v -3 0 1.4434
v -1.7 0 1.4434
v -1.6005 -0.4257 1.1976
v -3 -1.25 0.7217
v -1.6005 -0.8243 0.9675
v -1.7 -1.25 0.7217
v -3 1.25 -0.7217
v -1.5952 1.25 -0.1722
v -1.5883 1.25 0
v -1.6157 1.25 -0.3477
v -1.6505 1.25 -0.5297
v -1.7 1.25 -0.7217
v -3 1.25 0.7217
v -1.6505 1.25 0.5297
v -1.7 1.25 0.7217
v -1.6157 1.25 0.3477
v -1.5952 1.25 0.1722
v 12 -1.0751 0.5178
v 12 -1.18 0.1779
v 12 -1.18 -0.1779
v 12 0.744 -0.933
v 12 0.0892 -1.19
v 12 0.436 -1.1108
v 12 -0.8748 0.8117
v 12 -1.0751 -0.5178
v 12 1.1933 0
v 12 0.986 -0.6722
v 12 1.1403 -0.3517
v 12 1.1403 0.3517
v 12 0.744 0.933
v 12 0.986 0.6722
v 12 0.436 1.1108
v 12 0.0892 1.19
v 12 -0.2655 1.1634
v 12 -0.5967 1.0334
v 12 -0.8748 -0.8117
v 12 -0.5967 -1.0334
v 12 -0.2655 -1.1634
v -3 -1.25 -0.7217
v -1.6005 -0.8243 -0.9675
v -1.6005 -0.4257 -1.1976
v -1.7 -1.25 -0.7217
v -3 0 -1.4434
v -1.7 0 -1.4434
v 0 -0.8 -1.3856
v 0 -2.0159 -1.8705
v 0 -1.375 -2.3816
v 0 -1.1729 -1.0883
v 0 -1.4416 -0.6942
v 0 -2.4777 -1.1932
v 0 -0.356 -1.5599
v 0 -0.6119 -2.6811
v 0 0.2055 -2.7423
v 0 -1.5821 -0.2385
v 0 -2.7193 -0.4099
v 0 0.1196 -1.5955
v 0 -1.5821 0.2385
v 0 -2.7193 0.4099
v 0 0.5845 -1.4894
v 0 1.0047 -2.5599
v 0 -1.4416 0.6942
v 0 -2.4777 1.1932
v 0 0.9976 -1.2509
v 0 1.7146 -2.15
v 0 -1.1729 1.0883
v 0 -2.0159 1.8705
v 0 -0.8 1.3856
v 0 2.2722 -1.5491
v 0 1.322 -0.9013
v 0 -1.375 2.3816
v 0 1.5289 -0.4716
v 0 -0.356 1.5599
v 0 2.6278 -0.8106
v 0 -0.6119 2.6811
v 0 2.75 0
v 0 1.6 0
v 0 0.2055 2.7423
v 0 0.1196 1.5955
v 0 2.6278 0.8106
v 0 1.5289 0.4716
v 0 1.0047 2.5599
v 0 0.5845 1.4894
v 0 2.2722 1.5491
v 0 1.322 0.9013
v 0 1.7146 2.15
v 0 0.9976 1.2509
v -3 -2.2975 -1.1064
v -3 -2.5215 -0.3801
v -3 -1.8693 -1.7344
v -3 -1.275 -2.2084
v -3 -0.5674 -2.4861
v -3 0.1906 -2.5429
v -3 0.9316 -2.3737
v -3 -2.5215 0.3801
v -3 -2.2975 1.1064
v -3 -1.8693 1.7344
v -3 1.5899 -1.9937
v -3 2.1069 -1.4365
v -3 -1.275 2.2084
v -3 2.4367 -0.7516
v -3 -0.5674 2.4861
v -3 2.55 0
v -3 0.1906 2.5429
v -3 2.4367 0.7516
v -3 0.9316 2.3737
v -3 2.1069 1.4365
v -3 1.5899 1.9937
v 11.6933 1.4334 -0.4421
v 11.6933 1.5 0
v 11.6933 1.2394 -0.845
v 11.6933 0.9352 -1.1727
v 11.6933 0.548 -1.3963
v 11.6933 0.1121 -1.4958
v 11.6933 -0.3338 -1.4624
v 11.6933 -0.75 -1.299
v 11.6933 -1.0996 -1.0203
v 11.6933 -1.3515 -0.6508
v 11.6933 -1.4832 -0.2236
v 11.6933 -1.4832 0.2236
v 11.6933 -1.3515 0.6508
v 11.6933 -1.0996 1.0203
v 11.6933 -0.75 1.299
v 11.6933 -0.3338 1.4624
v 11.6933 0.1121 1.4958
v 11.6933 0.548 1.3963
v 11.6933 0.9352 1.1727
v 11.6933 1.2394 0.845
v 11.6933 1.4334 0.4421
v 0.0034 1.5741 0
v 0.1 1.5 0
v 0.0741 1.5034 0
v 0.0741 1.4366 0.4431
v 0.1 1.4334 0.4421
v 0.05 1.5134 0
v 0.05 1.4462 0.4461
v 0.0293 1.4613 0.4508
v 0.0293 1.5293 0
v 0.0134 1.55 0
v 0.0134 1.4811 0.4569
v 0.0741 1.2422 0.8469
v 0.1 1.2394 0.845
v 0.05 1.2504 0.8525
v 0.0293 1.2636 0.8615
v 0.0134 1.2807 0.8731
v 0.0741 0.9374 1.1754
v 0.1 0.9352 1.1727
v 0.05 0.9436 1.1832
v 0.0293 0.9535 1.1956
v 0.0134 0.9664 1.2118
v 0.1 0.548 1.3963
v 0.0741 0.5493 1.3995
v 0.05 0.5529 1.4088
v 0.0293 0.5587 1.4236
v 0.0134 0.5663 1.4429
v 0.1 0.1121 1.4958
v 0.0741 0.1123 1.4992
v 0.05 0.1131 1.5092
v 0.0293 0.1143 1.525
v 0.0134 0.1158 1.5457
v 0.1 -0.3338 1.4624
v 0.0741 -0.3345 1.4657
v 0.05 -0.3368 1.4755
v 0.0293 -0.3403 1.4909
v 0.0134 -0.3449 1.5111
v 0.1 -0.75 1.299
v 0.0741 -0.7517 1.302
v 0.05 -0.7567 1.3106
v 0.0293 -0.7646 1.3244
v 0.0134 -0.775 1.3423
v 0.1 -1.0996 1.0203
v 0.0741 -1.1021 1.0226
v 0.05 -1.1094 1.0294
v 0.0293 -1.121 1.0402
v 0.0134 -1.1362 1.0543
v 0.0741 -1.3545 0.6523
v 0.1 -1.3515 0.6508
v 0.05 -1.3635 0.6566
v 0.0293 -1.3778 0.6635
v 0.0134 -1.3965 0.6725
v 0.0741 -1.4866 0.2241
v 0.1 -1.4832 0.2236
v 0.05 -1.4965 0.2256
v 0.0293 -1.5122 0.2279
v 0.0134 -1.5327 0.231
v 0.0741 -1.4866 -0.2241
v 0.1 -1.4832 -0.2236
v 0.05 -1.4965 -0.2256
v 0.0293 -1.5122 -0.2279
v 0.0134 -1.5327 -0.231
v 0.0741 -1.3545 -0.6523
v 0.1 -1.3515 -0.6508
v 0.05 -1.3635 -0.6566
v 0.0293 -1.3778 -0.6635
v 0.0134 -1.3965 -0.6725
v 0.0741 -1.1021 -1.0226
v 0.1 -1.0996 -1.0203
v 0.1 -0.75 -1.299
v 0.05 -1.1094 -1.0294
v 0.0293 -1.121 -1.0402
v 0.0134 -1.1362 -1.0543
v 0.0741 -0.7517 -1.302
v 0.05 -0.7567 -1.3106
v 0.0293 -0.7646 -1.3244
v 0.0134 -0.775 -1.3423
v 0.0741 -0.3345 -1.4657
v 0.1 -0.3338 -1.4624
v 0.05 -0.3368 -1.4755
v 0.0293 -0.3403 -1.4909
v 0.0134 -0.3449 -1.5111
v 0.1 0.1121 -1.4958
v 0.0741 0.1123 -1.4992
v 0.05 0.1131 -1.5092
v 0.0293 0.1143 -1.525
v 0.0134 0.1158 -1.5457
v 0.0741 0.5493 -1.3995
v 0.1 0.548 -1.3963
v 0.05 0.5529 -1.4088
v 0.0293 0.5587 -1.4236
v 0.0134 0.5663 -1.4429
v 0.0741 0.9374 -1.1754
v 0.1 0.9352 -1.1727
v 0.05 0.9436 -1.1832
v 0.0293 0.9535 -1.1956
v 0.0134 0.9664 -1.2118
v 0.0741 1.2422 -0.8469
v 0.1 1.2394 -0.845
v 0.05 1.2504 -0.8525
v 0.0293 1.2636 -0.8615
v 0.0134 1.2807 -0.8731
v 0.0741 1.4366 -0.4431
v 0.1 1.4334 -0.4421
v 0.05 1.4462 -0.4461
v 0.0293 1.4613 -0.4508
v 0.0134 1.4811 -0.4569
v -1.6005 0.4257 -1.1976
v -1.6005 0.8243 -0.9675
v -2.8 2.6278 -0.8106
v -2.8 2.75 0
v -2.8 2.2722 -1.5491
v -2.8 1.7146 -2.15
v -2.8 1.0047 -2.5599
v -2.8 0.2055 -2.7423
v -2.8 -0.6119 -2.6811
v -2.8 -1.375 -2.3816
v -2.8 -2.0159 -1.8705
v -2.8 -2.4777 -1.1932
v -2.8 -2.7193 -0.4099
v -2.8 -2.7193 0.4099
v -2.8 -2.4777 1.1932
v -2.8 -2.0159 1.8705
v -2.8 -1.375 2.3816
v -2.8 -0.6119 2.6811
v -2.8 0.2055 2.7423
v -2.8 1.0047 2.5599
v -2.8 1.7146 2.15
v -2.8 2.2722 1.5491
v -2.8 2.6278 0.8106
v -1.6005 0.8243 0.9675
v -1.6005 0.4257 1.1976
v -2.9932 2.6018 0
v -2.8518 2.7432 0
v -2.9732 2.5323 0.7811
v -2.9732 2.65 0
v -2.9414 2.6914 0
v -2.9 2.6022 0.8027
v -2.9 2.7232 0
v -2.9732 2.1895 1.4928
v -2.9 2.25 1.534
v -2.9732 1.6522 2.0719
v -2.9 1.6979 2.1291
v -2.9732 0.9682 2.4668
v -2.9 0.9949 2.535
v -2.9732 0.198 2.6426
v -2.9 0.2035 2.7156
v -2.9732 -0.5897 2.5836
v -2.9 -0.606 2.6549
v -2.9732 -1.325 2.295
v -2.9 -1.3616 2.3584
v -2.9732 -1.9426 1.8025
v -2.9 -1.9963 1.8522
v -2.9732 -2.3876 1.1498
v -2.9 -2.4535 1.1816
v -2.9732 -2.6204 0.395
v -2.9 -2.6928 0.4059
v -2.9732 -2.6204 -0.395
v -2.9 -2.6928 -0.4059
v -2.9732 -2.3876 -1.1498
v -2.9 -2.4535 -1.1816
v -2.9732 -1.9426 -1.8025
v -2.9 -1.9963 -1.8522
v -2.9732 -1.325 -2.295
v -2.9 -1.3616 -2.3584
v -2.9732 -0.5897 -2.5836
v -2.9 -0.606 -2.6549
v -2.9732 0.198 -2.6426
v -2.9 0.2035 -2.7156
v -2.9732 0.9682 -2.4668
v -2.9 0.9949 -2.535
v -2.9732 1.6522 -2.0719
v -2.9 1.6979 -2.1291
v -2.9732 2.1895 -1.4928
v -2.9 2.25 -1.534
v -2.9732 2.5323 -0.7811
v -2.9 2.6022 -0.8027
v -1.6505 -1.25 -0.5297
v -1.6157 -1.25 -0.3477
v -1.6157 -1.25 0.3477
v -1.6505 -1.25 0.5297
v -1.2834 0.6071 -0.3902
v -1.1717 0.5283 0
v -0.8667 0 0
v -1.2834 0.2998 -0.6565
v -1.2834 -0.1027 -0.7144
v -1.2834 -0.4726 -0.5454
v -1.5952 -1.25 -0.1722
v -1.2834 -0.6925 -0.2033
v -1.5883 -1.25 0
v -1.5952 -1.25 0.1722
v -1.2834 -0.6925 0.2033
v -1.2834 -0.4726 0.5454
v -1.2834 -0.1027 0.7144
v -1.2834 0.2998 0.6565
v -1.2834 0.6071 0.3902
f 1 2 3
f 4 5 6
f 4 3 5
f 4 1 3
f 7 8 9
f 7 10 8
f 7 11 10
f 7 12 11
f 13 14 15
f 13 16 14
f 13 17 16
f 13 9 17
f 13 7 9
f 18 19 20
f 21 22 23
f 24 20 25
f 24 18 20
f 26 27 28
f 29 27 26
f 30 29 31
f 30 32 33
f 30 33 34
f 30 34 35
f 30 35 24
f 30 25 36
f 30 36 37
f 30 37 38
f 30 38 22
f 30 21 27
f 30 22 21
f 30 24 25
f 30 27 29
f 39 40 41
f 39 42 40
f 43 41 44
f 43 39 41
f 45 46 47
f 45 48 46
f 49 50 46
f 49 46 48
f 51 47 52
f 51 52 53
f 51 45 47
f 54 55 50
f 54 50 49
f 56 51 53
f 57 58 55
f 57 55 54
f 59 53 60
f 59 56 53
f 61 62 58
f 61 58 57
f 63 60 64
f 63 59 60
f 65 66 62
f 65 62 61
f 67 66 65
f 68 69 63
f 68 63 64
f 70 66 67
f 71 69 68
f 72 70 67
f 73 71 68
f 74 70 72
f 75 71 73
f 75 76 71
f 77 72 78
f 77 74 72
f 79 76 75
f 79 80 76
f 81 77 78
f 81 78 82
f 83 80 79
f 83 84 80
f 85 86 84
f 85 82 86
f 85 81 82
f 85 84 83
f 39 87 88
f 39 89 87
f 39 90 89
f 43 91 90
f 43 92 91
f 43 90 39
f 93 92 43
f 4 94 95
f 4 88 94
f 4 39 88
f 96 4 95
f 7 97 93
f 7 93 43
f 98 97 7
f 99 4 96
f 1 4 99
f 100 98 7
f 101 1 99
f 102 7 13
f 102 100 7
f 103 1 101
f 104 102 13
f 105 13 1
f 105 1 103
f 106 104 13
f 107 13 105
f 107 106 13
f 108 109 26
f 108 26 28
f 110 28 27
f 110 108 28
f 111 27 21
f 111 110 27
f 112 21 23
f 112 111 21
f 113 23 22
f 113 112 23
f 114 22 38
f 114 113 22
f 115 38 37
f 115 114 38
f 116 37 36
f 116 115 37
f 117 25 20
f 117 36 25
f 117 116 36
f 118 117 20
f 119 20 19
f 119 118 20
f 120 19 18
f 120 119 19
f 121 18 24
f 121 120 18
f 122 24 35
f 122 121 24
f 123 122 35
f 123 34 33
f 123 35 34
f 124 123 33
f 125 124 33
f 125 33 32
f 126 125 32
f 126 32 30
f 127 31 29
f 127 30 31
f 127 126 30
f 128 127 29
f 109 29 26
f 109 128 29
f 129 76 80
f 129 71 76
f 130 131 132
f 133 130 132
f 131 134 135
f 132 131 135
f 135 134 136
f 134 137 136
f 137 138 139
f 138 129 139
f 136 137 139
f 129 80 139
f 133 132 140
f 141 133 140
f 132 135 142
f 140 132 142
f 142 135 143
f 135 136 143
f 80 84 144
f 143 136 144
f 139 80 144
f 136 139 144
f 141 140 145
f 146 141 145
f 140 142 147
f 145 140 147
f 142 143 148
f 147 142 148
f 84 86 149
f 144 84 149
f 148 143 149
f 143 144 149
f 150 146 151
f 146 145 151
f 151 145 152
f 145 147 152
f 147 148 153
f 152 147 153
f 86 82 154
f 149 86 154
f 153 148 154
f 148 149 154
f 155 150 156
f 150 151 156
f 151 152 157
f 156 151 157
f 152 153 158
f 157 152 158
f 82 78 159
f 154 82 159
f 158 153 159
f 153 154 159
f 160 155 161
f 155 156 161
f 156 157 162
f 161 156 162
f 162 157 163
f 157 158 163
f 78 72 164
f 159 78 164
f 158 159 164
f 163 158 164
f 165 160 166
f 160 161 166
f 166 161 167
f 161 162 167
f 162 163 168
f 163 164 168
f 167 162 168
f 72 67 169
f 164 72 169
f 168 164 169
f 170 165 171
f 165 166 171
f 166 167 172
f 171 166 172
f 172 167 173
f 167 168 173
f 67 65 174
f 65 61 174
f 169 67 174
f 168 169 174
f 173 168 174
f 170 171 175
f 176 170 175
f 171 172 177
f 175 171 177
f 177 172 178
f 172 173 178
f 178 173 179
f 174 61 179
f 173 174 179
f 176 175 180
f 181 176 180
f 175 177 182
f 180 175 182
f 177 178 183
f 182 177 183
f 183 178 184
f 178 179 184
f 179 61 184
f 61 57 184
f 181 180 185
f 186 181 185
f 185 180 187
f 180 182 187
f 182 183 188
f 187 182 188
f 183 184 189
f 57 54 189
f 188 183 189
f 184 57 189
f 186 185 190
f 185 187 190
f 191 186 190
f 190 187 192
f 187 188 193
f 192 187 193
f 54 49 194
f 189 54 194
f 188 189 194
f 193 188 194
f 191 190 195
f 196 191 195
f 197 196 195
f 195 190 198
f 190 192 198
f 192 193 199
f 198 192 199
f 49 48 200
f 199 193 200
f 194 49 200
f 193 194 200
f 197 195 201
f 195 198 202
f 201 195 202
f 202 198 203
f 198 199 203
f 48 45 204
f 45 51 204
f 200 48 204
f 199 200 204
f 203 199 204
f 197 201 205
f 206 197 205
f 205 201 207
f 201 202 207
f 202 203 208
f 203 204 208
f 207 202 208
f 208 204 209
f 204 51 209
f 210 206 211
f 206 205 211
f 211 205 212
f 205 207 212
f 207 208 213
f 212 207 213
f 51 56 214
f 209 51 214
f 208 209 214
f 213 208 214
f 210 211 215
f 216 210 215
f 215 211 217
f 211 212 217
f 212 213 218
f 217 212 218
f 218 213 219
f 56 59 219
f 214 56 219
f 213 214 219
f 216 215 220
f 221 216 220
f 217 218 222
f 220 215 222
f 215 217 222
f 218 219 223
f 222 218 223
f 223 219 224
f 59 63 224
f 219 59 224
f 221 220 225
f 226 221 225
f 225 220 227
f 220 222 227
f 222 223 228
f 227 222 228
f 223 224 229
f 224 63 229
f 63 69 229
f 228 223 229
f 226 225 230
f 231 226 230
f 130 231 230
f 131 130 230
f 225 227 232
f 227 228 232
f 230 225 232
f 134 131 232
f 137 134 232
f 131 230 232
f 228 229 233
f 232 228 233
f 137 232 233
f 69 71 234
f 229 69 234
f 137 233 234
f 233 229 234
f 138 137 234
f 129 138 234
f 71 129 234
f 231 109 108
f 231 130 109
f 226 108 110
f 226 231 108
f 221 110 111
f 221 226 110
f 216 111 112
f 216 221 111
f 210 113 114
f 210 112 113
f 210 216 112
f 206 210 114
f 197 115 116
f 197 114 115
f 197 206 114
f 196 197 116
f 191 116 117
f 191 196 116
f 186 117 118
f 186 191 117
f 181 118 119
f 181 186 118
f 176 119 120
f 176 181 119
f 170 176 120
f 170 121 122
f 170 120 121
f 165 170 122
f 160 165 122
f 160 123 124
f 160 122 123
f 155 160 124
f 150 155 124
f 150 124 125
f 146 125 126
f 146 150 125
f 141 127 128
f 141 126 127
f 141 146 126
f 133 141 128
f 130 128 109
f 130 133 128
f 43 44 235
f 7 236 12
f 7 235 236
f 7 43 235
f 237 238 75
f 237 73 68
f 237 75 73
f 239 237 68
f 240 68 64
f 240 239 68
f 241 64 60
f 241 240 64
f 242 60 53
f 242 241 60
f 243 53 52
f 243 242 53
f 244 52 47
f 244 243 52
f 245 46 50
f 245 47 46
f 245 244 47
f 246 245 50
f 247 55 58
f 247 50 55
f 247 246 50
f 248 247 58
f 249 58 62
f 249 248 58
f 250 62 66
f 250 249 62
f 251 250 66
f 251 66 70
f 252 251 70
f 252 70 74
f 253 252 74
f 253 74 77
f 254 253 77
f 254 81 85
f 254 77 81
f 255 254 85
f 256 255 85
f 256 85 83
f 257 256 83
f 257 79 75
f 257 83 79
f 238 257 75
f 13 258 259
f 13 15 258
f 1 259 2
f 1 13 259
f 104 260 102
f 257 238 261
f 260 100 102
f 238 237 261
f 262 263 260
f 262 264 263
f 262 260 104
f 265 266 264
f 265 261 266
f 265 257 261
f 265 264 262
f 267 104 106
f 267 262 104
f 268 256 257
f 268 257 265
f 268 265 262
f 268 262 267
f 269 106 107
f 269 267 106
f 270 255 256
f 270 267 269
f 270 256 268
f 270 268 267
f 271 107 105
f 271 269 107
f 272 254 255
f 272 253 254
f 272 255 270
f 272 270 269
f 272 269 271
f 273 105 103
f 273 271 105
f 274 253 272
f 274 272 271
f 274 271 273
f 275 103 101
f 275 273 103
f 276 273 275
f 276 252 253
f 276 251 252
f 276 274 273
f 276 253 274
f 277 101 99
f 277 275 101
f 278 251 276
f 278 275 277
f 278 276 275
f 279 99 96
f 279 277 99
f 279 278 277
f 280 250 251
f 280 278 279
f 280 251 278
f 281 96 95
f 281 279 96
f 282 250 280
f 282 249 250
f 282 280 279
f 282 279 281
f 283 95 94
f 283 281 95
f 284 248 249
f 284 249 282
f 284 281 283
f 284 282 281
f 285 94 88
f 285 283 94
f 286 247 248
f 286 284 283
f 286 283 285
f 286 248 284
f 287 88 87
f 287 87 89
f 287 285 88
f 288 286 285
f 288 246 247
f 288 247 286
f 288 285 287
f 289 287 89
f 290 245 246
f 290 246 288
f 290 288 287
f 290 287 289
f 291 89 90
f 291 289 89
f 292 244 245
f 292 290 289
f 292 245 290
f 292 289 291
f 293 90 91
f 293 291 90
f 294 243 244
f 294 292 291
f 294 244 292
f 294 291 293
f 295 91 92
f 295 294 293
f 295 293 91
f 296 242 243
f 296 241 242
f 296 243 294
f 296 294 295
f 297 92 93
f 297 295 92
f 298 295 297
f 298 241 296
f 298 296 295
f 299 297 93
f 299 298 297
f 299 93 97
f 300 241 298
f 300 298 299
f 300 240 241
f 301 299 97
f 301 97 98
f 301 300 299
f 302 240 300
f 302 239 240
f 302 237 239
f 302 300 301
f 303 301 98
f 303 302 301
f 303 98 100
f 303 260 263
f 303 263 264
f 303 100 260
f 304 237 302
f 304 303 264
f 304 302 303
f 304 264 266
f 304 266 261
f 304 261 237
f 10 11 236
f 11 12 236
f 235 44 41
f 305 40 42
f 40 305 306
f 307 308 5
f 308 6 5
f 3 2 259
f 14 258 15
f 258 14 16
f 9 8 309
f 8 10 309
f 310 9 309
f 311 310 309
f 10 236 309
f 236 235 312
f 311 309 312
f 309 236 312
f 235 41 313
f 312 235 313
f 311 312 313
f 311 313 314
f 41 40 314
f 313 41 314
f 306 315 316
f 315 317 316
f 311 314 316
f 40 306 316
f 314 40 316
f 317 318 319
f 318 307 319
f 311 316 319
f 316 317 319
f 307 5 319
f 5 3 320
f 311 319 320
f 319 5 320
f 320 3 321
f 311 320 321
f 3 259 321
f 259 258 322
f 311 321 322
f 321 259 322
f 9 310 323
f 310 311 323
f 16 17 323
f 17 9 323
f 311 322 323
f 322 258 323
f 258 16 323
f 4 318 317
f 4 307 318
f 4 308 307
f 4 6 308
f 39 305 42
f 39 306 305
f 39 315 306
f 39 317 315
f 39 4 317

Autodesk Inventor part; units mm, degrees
ref_plane "YZ Plane" through (0, 0, 0) normal (1, 0, 0) x (0, 1, 0)
ref_plane "XZ Plane" through (0, 0, 0) normal (0, 1, 0) x (-1, 0, 0)
sketch "Szkic1" plane through (0, 0, 0) normal (0, 0, 1) x (1, 0, 0)
  line L0 (-0.8667, 0) -> (12, 0)
  line L1 (12, 0) -> (12, 1.5)
  line L2 (12, 1.5) -> (1.25, 1.5)
  line L3 (1.25, 1.5) -> (0.9432, 1.5)
  line L4 (0.9432, 1.5) -> (0, 1.5)
  line L5 (0, 1.5) -> (0, 2.75)
  line L6 (0, 2.75) -> (-3, 2.75)
  line L7 (-3, 2.75) -> (-3, 1.4434)
  line L8 (-3, 1.4434) -> (-1.7, 1.4434)
  line L9 (-1.7, 1.4434) -> (-0.8667, 0)
  line L10 (-6, 0) -> (15, 0) projected
  line L11 (0, -0.55) -> (0, 3.3) projected
  line L12 (1.25, 1.5) -> (0, 1.5) construction
  dimension "d1" = 10.75
  dimension "d2" = 0.3068
  dimension "d3" = 3
  dimension "d4" = 1.3
  dimension "d5" = 60
  dimension "d6" = 3
  dimension "d7" = 3
  dimension "d8" = 2.8868
  dimension "d9" = 5.5
  dimension "d26" = 12
revolve "Bryła" add sketch "Szkic1" angle 360 about axis through (-0.8667, 0, 0) along (1, 0, 0)
sketch "Szkic2" plane through (-3, 0, 0) normal (-1, 0, 0) x (0, 0, 1)
  circle A0 centre (0, 0) radius 1.4434 projected
  line L0 (0, -3.85) -> (0, 3.85) projected
  line L1 (-3.85, 0) -> (3.85, 0) projected
  line L2 (1.4434, 0) -> (0.7217, -1.25)
  line L3 (0.7217, -1.25) -> (-0.7217, -1.25)
  line L4 (-0.7217, -1.25) -> (-1.4434, 0)
  line L5 (-1.4434, 0) -> (-0.7217, 1.25)
  line L6 (-0.7217, 1.25) -> (0.7217, 1.25)
  line L7 (0.7217, 1.25) -> (1.4434, 0)
  point P0 (0, 0)
extrude "Szczelina" add sketch "Szkic2" against normal up to next contours L7 A0 | A0 L2 | L6 L0 A0 | A0 L0 L3 | L0 L6 A0 | A0 L3 L0 | L4 A0 | A0 L5
fillet "Zaokrąglenie1" radius 0.2 1 edges at (-3, -2.75, 0)
thread "Gwint" size "M3x0.5" class "6g" standard "ISO Metric profile" length 10.75
chamfer "Faza1" distance 0.3067 distance2 0.3067 1 edges at (12, -1.5, 0) measured on face at (12, -0.6587, -0.1791)
ref_plane "Work Plane1" through (29, 0, 0) normal (0, -1, 0) x (1, 0, 0)
fillet "Fillet2" radius 0.1 1 edges at (0, -1.5, 0)
equation "\"d1\" = GEL"
equation "\"d3\" = KOH"
equation "\"d4\" = INTI"
equation "\"d6\" = GD"
equation "\"d7\" = BDM"
equation "\"d8\" = 1.1547 * SW"
equation "\"d9\" = KOD"
equation "\"d26\" = NLG"
equation "\"d30\" = R"
equation "\"d17\" = RR"
equation "\"d13\" = GEL"
equation "\"d15\" = -0.5 * SPD + 0.5 * GD"
equation "\"d16\" = GUL"
equation "\"GD\" = NND"
equation "\"NLG\" = 12"
equation "\"GEL\" = 10.75"
equation "\"KOD\" = 5.5"
equation "\"KOH\" = NND"
equation "\"INTI\" = 1.3"
equation "\"GAL\" = 0.61345 * PTC"
equation "\"GUL\" = 0.61345 * PTC"
equation "\"BDM\" = NND"
equation "\"SW\" = 2.5"
equation "\"RR\" = 0.2"
equation "\"SPD\" = NND - 1.2269 * PTC"
equation "\"R\" = 0.1"
equation "\"TOA\" = 30deg"
equation "\"GD1\" = THREADDIA - 1.2269 * PTC"
equation "\"THREADDIA\" = 3"
equation "\"FAWI\" = 45deg"
equation "\"PTC\" = 0.5"
equation "\"NND\" = 3"
equation "\"E0\" = 1.155 * SW"
properties part number "CNS 3932 - M 3 x 12" material "Stal, miękka"
